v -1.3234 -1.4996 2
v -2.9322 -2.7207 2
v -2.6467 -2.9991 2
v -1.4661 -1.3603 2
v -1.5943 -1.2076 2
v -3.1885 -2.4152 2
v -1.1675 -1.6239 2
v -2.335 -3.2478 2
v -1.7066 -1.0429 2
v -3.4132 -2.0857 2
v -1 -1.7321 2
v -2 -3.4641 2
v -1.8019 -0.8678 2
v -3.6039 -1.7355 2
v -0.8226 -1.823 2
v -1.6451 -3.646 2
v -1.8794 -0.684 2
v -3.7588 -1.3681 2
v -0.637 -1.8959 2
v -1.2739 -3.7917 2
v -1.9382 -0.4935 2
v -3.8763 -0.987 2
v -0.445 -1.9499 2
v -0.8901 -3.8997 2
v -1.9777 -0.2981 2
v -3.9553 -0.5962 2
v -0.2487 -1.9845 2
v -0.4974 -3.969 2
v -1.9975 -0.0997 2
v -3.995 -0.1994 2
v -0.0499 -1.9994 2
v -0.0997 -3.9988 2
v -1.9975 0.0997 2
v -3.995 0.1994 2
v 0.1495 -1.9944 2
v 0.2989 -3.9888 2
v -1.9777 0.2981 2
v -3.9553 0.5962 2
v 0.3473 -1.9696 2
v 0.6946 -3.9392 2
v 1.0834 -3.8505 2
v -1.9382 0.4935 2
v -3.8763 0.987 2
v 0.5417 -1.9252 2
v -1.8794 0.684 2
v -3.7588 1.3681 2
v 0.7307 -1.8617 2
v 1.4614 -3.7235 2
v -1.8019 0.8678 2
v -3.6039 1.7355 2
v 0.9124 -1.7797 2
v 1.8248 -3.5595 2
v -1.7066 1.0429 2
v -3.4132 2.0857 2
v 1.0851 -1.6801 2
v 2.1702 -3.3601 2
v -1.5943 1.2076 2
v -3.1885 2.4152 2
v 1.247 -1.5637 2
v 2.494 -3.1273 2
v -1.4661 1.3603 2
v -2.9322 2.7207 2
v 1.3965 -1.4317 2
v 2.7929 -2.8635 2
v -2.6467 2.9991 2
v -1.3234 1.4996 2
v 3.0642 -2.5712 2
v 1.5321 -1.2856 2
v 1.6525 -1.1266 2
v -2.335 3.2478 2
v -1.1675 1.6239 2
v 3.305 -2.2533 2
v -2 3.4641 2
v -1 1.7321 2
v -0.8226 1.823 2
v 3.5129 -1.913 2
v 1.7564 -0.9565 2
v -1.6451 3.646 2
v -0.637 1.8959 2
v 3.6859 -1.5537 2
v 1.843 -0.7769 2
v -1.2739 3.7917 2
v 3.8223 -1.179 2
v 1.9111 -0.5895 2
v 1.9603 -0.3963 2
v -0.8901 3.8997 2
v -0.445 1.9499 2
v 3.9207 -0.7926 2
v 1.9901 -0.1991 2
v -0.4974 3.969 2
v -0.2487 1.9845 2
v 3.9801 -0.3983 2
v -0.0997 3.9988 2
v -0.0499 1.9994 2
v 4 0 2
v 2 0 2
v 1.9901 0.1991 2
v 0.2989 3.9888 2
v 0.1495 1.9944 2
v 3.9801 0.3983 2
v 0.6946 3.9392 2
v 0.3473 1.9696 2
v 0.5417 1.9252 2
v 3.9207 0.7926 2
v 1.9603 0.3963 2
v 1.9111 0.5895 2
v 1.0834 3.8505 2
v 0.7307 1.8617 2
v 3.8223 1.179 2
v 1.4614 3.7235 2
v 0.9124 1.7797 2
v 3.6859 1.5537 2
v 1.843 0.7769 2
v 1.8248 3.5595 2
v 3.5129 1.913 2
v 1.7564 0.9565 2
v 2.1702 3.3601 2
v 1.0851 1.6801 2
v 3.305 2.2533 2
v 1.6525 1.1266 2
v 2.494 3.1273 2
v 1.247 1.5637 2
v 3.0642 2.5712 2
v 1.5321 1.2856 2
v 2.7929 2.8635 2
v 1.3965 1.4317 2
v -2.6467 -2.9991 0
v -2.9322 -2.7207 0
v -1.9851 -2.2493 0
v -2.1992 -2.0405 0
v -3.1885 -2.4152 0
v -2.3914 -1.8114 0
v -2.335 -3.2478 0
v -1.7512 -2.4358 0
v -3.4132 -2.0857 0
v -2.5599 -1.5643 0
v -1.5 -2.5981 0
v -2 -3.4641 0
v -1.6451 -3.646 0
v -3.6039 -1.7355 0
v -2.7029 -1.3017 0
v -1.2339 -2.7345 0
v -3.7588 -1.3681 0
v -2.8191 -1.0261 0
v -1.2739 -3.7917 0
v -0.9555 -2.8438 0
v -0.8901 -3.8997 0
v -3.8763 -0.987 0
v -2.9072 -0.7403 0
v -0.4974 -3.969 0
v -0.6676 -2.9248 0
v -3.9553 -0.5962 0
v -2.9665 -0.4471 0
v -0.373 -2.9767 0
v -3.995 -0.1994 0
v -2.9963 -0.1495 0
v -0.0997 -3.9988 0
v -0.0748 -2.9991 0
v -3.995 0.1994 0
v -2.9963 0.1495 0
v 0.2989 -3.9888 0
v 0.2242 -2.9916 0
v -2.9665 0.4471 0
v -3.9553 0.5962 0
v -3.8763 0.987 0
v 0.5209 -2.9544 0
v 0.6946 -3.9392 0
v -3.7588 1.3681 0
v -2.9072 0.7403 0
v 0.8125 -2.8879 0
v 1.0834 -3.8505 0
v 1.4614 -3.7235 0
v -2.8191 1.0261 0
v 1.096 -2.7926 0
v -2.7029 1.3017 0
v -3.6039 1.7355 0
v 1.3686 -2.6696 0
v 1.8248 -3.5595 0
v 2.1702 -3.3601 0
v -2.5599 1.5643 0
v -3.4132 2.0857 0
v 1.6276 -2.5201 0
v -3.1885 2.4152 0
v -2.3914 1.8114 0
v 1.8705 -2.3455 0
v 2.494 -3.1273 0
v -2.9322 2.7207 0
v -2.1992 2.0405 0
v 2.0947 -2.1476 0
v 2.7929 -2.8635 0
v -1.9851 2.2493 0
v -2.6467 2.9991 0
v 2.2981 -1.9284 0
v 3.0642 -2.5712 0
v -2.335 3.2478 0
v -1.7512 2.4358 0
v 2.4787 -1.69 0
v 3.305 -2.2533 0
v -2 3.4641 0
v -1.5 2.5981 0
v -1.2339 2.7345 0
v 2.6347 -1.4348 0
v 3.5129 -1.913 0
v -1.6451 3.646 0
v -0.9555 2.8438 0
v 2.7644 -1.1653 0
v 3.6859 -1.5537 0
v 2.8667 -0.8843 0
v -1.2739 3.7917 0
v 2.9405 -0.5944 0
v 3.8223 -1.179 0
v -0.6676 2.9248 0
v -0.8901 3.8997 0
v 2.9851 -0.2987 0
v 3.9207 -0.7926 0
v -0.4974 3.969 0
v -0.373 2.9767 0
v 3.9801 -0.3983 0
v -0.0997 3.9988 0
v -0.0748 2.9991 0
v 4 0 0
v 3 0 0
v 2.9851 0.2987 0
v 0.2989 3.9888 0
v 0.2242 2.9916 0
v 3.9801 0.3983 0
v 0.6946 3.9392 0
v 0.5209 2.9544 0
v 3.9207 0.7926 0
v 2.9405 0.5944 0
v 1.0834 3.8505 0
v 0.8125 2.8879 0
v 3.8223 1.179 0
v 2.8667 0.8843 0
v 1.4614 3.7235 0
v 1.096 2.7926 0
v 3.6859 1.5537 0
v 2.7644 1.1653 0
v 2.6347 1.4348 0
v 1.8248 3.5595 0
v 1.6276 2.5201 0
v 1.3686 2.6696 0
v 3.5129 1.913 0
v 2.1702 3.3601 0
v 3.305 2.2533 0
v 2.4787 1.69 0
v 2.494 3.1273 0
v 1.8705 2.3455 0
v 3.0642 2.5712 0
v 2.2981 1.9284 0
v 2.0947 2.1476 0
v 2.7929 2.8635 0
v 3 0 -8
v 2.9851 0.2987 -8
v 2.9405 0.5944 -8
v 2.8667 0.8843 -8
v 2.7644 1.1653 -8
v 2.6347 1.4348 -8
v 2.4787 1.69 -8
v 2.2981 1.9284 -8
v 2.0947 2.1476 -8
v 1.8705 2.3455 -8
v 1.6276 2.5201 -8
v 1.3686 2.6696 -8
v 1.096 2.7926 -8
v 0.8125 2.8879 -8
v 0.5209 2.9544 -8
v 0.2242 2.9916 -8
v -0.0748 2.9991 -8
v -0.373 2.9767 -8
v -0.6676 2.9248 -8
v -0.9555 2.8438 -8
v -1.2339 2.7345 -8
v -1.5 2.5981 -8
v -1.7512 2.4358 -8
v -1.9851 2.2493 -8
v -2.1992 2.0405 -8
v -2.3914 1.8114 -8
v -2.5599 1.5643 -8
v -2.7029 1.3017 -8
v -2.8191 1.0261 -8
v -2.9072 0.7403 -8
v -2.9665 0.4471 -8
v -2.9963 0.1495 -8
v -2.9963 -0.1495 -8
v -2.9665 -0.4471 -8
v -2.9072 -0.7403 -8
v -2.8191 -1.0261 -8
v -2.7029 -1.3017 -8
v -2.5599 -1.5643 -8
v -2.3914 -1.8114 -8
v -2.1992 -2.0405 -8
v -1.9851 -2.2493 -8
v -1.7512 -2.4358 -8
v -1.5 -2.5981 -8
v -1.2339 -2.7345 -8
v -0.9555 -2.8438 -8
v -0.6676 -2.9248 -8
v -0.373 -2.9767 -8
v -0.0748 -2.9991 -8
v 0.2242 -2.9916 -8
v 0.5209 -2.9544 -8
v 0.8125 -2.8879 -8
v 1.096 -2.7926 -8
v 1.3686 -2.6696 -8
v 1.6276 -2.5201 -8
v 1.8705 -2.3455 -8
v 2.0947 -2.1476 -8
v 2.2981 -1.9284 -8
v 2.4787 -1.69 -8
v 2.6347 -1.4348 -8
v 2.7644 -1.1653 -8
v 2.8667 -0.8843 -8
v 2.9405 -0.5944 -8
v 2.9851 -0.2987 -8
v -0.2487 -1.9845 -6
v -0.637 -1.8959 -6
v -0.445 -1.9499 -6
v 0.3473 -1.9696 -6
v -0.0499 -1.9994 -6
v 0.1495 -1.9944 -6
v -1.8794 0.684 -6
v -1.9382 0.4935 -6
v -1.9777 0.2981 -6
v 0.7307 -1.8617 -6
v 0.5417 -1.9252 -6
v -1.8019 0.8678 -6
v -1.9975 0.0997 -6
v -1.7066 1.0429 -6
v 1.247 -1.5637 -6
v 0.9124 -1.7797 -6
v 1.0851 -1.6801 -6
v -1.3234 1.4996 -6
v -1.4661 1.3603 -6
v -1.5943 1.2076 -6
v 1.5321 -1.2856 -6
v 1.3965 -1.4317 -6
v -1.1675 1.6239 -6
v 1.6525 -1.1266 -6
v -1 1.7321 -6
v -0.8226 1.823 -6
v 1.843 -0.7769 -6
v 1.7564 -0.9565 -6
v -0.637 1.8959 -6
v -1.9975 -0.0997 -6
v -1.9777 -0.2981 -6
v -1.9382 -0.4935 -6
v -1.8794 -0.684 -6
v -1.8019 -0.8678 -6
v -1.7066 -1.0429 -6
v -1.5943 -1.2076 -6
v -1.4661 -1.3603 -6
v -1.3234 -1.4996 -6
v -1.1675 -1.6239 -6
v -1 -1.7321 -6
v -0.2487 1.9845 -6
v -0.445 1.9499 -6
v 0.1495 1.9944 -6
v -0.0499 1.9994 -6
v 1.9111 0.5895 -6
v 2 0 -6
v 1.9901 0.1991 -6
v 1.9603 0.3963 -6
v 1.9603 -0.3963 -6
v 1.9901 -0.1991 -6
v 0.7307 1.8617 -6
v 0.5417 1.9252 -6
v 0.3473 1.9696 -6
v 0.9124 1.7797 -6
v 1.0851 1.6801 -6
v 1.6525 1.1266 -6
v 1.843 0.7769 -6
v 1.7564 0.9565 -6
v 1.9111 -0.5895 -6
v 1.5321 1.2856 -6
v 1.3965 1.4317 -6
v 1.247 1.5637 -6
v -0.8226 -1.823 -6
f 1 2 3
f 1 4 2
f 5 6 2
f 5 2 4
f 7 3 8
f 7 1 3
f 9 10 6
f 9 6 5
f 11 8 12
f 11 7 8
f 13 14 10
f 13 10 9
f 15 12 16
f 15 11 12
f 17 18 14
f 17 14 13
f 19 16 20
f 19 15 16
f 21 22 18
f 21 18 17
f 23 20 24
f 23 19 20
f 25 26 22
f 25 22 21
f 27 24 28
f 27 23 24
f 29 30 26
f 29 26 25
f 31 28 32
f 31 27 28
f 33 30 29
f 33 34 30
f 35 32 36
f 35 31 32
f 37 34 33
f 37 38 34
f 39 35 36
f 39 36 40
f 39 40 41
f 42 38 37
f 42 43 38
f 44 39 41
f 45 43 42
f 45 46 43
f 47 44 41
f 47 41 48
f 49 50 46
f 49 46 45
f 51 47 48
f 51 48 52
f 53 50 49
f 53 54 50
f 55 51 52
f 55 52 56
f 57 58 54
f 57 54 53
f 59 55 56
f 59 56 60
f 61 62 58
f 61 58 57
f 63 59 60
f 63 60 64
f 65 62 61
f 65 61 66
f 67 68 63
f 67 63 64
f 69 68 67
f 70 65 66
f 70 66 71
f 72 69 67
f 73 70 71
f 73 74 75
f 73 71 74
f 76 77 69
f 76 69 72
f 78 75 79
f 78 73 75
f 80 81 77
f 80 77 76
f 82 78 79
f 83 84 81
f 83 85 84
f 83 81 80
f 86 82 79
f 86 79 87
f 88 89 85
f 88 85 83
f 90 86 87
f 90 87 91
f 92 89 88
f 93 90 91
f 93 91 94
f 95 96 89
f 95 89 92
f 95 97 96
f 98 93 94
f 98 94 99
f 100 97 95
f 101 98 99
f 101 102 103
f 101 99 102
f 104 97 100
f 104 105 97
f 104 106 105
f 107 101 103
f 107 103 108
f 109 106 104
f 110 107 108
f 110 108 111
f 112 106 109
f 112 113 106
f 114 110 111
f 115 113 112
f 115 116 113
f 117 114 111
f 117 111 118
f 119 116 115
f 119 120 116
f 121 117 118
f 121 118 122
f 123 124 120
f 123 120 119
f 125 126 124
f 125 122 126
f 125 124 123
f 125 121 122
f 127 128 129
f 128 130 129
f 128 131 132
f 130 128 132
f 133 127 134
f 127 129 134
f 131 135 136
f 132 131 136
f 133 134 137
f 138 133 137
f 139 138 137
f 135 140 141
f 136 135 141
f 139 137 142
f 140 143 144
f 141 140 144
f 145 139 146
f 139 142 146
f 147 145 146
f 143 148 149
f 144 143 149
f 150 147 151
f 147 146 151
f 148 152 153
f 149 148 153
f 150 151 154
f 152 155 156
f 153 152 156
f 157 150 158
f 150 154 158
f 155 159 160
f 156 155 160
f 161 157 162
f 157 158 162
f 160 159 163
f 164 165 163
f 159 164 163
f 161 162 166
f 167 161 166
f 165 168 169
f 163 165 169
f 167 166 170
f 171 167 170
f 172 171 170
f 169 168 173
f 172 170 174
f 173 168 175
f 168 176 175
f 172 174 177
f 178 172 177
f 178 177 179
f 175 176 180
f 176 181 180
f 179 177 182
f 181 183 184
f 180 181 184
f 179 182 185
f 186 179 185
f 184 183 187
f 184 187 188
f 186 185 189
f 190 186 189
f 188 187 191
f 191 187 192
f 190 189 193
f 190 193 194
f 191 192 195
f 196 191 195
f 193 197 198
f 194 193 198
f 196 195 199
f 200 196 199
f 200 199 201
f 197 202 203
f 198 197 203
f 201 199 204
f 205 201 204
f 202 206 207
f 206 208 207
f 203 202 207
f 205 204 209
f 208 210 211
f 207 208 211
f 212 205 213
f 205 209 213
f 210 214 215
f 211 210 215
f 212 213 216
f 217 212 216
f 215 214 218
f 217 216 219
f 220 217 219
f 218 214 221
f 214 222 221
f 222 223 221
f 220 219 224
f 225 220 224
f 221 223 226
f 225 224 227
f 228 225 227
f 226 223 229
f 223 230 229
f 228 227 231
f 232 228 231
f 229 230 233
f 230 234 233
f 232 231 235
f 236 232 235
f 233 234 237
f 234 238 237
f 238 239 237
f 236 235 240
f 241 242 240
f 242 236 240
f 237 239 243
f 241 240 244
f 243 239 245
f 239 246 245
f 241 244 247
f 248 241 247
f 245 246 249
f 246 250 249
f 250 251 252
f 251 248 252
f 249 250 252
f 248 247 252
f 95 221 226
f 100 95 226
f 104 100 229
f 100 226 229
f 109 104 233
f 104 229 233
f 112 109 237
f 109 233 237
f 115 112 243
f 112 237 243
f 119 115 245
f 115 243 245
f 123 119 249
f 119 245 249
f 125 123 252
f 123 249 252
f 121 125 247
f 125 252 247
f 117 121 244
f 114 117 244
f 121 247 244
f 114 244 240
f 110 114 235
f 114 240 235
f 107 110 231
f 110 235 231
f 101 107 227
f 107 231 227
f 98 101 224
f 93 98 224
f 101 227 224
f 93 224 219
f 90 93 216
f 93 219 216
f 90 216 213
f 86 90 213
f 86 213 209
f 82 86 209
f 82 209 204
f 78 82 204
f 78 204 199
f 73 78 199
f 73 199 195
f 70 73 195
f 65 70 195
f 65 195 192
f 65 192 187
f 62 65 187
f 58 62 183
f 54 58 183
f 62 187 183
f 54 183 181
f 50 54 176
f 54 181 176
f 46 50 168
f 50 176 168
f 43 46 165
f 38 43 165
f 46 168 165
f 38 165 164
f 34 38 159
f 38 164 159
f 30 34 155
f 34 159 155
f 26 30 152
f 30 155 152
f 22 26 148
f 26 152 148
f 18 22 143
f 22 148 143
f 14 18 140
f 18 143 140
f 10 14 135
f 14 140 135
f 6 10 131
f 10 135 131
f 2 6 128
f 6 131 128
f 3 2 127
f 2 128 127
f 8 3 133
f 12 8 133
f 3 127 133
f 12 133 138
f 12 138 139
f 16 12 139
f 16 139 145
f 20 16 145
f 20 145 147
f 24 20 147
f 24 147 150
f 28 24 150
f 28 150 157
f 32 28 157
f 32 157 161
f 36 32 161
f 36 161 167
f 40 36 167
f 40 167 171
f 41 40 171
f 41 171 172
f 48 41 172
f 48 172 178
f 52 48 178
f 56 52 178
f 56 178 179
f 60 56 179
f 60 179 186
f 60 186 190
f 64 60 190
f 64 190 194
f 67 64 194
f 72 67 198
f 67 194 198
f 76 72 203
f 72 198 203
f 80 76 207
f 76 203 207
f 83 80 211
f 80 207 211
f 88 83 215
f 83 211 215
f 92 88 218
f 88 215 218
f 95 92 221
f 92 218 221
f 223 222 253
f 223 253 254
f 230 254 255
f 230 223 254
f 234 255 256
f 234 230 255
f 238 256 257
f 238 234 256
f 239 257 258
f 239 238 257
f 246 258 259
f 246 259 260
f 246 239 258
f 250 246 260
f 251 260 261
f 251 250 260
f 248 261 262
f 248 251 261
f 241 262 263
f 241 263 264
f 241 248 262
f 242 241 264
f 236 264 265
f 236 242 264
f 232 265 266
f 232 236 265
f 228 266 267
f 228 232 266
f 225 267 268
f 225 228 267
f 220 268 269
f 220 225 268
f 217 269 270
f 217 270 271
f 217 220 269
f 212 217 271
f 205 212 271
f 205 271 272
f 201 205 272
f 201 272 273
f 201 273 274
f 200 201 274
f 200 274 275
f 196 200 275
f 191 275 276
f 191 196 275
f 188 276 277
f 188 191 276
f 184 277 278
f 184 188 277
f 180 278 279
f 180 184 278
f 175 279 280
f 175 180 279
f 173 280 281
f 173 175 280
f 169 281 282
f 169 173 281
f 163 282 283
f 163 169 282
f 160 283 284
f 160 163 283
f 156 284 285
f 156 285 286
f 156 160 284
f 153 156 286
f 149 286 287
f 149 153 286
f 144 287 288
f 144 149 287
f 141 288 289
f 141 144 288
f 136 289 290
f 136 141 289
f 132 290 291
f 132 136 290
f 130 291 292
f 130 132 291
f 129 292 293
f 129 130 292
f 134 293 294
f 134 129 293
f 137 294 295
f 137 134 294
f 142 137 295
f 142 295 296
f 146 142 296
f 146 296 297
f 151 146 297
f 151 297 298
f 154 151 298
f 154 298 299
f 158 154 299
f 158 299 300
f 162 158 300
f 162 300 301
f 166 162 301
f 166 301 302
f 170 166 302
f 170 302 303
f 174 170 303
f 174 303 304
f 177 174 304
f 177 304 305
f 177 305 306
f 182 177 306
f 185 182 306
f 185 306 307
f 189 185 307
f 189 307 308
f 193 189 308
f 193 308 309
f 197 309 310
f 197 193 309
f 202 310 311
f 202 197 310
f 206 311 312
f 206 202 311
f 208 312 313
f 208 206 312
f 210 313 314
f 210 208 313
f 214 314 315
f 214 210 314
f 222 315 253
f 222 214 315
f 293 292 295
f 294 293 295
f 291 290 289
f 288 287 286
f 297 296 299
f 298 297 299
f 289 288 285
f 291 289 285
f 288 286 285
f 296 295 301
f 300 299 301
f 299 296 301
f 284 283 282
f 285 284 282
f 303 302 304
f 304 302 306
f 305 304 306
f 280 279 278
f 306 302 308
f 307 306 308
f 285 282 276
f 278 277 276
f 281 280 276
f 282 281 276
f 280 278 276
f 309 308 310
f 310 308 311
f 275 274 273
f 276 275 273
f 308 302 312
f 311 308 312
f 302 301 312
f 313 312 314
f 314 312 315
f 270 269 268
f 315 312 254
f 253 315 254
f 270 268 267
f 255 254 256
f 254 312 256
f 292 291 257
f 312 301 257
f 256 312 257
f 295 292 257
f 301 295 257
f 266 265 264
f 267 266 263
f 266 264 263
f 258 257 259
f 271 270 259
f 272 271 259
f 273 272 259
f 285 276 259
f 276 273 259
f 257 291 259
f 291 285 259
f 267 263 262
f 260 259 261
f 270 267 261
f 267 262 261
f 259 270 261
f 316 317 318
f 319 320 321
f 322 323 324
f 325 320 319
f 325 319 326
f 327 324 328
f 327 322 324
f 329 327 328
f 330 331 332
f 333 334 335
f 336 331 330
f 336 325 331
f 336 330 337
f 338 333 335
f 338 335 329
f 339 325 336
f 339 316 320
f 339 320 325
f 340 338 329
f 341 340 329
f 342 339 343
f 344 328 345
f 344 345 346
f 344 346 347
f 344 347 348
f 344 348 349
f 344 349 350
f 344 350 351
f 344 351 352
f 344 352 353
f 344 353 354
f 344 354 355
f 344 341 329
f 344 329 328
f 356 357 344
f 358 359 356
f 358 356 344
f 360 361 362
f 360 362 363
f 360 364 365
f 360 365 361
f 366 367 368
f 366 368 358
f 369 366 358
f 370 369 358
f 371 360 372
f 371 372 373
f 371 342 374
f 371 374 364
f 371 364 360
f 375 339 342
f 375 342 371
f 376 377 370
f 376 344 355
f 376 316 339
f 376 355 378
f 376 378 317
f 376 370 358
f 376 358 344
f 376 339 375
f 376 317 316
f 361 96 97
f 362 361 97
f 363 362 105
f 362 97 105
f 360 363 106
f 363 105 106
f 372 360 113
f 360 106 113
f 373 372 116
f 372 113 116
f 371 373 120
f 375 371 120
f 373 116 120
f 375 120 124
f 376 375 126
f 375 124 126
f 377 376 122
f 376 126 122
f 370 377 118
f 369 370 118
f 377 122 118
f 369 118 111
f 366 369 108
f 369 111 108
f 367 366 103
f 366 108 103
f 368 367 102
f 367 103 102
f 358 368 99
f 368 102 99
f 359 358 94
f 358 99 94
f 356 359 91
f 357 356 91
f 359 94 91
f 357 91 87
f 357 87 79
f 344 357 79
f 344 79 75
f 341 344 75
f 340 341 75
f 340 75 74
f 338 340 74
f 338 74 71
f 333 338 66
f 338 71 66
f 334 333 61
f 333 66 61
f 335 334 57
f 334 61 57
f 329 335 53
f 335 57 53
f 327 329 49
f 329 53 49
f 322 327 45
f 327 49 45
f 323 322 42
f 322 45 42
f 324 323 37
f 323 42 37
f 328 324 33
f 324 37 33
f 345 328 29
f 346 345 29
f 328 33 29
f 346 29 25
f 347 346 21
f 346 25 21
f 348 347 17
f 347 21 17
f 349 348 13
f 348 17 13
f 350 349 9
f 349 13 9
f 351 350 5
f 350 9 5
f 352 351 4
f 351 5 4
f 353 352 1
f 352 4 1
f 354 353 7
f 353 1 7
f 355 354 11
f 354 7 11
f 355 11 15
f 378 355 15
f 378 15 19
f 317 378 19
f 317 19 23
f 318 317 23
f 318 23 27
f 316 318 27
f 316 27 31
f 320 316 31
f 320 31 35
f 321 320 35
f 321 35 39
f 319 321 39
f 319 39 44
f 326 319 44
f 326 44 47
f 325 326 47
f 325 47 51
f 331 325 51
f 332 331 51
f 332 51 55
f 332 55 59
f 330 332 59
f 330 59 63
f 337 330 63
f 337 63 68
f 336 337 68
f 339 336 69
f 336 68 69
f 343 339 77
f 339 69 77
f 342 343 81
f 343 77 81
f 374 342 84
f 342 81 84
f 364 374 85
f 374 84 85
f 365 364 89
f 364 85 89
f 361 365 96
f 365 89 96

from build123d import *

# Parameters (mm, degrees)
SKETCH1_R           = 4
BOSS_EXTRUDE1_DEPTH = 2
SKETCH2_R           = 3
BOSS_EXTRUDE2_DEPTH = 8
SKETCH3_R           = 2
CUT_EXTRUDE1_DEPTH  = 8


with BuildPart() as part:
    # Sketch1 → Boss-Extrude1 (new body)
    with BuildSketch(Plane.XY):
        Circle(SKETCH1_R)
    extrude(amount=BOSS_EXTRUDE1_DEPTH)

    # Sketch2 → Boss-Extrude2 (add)
    with BuildSketch(Plane.XY):
        Circle(SKETCH2_R)
    extrude(amount=-BOSS_EXTRUDE2_DEPTH)

    # Sketch3 → Cut-Extrude1 (cut)
    with BuildSketch(Plane.XY.offset(2)):
        Circle(SKETCH3_R)
    extrude(amount=-CUT_EXTRUDE1_DEPTH, mode=Mode.SUBTRACT)


solid = part.part
